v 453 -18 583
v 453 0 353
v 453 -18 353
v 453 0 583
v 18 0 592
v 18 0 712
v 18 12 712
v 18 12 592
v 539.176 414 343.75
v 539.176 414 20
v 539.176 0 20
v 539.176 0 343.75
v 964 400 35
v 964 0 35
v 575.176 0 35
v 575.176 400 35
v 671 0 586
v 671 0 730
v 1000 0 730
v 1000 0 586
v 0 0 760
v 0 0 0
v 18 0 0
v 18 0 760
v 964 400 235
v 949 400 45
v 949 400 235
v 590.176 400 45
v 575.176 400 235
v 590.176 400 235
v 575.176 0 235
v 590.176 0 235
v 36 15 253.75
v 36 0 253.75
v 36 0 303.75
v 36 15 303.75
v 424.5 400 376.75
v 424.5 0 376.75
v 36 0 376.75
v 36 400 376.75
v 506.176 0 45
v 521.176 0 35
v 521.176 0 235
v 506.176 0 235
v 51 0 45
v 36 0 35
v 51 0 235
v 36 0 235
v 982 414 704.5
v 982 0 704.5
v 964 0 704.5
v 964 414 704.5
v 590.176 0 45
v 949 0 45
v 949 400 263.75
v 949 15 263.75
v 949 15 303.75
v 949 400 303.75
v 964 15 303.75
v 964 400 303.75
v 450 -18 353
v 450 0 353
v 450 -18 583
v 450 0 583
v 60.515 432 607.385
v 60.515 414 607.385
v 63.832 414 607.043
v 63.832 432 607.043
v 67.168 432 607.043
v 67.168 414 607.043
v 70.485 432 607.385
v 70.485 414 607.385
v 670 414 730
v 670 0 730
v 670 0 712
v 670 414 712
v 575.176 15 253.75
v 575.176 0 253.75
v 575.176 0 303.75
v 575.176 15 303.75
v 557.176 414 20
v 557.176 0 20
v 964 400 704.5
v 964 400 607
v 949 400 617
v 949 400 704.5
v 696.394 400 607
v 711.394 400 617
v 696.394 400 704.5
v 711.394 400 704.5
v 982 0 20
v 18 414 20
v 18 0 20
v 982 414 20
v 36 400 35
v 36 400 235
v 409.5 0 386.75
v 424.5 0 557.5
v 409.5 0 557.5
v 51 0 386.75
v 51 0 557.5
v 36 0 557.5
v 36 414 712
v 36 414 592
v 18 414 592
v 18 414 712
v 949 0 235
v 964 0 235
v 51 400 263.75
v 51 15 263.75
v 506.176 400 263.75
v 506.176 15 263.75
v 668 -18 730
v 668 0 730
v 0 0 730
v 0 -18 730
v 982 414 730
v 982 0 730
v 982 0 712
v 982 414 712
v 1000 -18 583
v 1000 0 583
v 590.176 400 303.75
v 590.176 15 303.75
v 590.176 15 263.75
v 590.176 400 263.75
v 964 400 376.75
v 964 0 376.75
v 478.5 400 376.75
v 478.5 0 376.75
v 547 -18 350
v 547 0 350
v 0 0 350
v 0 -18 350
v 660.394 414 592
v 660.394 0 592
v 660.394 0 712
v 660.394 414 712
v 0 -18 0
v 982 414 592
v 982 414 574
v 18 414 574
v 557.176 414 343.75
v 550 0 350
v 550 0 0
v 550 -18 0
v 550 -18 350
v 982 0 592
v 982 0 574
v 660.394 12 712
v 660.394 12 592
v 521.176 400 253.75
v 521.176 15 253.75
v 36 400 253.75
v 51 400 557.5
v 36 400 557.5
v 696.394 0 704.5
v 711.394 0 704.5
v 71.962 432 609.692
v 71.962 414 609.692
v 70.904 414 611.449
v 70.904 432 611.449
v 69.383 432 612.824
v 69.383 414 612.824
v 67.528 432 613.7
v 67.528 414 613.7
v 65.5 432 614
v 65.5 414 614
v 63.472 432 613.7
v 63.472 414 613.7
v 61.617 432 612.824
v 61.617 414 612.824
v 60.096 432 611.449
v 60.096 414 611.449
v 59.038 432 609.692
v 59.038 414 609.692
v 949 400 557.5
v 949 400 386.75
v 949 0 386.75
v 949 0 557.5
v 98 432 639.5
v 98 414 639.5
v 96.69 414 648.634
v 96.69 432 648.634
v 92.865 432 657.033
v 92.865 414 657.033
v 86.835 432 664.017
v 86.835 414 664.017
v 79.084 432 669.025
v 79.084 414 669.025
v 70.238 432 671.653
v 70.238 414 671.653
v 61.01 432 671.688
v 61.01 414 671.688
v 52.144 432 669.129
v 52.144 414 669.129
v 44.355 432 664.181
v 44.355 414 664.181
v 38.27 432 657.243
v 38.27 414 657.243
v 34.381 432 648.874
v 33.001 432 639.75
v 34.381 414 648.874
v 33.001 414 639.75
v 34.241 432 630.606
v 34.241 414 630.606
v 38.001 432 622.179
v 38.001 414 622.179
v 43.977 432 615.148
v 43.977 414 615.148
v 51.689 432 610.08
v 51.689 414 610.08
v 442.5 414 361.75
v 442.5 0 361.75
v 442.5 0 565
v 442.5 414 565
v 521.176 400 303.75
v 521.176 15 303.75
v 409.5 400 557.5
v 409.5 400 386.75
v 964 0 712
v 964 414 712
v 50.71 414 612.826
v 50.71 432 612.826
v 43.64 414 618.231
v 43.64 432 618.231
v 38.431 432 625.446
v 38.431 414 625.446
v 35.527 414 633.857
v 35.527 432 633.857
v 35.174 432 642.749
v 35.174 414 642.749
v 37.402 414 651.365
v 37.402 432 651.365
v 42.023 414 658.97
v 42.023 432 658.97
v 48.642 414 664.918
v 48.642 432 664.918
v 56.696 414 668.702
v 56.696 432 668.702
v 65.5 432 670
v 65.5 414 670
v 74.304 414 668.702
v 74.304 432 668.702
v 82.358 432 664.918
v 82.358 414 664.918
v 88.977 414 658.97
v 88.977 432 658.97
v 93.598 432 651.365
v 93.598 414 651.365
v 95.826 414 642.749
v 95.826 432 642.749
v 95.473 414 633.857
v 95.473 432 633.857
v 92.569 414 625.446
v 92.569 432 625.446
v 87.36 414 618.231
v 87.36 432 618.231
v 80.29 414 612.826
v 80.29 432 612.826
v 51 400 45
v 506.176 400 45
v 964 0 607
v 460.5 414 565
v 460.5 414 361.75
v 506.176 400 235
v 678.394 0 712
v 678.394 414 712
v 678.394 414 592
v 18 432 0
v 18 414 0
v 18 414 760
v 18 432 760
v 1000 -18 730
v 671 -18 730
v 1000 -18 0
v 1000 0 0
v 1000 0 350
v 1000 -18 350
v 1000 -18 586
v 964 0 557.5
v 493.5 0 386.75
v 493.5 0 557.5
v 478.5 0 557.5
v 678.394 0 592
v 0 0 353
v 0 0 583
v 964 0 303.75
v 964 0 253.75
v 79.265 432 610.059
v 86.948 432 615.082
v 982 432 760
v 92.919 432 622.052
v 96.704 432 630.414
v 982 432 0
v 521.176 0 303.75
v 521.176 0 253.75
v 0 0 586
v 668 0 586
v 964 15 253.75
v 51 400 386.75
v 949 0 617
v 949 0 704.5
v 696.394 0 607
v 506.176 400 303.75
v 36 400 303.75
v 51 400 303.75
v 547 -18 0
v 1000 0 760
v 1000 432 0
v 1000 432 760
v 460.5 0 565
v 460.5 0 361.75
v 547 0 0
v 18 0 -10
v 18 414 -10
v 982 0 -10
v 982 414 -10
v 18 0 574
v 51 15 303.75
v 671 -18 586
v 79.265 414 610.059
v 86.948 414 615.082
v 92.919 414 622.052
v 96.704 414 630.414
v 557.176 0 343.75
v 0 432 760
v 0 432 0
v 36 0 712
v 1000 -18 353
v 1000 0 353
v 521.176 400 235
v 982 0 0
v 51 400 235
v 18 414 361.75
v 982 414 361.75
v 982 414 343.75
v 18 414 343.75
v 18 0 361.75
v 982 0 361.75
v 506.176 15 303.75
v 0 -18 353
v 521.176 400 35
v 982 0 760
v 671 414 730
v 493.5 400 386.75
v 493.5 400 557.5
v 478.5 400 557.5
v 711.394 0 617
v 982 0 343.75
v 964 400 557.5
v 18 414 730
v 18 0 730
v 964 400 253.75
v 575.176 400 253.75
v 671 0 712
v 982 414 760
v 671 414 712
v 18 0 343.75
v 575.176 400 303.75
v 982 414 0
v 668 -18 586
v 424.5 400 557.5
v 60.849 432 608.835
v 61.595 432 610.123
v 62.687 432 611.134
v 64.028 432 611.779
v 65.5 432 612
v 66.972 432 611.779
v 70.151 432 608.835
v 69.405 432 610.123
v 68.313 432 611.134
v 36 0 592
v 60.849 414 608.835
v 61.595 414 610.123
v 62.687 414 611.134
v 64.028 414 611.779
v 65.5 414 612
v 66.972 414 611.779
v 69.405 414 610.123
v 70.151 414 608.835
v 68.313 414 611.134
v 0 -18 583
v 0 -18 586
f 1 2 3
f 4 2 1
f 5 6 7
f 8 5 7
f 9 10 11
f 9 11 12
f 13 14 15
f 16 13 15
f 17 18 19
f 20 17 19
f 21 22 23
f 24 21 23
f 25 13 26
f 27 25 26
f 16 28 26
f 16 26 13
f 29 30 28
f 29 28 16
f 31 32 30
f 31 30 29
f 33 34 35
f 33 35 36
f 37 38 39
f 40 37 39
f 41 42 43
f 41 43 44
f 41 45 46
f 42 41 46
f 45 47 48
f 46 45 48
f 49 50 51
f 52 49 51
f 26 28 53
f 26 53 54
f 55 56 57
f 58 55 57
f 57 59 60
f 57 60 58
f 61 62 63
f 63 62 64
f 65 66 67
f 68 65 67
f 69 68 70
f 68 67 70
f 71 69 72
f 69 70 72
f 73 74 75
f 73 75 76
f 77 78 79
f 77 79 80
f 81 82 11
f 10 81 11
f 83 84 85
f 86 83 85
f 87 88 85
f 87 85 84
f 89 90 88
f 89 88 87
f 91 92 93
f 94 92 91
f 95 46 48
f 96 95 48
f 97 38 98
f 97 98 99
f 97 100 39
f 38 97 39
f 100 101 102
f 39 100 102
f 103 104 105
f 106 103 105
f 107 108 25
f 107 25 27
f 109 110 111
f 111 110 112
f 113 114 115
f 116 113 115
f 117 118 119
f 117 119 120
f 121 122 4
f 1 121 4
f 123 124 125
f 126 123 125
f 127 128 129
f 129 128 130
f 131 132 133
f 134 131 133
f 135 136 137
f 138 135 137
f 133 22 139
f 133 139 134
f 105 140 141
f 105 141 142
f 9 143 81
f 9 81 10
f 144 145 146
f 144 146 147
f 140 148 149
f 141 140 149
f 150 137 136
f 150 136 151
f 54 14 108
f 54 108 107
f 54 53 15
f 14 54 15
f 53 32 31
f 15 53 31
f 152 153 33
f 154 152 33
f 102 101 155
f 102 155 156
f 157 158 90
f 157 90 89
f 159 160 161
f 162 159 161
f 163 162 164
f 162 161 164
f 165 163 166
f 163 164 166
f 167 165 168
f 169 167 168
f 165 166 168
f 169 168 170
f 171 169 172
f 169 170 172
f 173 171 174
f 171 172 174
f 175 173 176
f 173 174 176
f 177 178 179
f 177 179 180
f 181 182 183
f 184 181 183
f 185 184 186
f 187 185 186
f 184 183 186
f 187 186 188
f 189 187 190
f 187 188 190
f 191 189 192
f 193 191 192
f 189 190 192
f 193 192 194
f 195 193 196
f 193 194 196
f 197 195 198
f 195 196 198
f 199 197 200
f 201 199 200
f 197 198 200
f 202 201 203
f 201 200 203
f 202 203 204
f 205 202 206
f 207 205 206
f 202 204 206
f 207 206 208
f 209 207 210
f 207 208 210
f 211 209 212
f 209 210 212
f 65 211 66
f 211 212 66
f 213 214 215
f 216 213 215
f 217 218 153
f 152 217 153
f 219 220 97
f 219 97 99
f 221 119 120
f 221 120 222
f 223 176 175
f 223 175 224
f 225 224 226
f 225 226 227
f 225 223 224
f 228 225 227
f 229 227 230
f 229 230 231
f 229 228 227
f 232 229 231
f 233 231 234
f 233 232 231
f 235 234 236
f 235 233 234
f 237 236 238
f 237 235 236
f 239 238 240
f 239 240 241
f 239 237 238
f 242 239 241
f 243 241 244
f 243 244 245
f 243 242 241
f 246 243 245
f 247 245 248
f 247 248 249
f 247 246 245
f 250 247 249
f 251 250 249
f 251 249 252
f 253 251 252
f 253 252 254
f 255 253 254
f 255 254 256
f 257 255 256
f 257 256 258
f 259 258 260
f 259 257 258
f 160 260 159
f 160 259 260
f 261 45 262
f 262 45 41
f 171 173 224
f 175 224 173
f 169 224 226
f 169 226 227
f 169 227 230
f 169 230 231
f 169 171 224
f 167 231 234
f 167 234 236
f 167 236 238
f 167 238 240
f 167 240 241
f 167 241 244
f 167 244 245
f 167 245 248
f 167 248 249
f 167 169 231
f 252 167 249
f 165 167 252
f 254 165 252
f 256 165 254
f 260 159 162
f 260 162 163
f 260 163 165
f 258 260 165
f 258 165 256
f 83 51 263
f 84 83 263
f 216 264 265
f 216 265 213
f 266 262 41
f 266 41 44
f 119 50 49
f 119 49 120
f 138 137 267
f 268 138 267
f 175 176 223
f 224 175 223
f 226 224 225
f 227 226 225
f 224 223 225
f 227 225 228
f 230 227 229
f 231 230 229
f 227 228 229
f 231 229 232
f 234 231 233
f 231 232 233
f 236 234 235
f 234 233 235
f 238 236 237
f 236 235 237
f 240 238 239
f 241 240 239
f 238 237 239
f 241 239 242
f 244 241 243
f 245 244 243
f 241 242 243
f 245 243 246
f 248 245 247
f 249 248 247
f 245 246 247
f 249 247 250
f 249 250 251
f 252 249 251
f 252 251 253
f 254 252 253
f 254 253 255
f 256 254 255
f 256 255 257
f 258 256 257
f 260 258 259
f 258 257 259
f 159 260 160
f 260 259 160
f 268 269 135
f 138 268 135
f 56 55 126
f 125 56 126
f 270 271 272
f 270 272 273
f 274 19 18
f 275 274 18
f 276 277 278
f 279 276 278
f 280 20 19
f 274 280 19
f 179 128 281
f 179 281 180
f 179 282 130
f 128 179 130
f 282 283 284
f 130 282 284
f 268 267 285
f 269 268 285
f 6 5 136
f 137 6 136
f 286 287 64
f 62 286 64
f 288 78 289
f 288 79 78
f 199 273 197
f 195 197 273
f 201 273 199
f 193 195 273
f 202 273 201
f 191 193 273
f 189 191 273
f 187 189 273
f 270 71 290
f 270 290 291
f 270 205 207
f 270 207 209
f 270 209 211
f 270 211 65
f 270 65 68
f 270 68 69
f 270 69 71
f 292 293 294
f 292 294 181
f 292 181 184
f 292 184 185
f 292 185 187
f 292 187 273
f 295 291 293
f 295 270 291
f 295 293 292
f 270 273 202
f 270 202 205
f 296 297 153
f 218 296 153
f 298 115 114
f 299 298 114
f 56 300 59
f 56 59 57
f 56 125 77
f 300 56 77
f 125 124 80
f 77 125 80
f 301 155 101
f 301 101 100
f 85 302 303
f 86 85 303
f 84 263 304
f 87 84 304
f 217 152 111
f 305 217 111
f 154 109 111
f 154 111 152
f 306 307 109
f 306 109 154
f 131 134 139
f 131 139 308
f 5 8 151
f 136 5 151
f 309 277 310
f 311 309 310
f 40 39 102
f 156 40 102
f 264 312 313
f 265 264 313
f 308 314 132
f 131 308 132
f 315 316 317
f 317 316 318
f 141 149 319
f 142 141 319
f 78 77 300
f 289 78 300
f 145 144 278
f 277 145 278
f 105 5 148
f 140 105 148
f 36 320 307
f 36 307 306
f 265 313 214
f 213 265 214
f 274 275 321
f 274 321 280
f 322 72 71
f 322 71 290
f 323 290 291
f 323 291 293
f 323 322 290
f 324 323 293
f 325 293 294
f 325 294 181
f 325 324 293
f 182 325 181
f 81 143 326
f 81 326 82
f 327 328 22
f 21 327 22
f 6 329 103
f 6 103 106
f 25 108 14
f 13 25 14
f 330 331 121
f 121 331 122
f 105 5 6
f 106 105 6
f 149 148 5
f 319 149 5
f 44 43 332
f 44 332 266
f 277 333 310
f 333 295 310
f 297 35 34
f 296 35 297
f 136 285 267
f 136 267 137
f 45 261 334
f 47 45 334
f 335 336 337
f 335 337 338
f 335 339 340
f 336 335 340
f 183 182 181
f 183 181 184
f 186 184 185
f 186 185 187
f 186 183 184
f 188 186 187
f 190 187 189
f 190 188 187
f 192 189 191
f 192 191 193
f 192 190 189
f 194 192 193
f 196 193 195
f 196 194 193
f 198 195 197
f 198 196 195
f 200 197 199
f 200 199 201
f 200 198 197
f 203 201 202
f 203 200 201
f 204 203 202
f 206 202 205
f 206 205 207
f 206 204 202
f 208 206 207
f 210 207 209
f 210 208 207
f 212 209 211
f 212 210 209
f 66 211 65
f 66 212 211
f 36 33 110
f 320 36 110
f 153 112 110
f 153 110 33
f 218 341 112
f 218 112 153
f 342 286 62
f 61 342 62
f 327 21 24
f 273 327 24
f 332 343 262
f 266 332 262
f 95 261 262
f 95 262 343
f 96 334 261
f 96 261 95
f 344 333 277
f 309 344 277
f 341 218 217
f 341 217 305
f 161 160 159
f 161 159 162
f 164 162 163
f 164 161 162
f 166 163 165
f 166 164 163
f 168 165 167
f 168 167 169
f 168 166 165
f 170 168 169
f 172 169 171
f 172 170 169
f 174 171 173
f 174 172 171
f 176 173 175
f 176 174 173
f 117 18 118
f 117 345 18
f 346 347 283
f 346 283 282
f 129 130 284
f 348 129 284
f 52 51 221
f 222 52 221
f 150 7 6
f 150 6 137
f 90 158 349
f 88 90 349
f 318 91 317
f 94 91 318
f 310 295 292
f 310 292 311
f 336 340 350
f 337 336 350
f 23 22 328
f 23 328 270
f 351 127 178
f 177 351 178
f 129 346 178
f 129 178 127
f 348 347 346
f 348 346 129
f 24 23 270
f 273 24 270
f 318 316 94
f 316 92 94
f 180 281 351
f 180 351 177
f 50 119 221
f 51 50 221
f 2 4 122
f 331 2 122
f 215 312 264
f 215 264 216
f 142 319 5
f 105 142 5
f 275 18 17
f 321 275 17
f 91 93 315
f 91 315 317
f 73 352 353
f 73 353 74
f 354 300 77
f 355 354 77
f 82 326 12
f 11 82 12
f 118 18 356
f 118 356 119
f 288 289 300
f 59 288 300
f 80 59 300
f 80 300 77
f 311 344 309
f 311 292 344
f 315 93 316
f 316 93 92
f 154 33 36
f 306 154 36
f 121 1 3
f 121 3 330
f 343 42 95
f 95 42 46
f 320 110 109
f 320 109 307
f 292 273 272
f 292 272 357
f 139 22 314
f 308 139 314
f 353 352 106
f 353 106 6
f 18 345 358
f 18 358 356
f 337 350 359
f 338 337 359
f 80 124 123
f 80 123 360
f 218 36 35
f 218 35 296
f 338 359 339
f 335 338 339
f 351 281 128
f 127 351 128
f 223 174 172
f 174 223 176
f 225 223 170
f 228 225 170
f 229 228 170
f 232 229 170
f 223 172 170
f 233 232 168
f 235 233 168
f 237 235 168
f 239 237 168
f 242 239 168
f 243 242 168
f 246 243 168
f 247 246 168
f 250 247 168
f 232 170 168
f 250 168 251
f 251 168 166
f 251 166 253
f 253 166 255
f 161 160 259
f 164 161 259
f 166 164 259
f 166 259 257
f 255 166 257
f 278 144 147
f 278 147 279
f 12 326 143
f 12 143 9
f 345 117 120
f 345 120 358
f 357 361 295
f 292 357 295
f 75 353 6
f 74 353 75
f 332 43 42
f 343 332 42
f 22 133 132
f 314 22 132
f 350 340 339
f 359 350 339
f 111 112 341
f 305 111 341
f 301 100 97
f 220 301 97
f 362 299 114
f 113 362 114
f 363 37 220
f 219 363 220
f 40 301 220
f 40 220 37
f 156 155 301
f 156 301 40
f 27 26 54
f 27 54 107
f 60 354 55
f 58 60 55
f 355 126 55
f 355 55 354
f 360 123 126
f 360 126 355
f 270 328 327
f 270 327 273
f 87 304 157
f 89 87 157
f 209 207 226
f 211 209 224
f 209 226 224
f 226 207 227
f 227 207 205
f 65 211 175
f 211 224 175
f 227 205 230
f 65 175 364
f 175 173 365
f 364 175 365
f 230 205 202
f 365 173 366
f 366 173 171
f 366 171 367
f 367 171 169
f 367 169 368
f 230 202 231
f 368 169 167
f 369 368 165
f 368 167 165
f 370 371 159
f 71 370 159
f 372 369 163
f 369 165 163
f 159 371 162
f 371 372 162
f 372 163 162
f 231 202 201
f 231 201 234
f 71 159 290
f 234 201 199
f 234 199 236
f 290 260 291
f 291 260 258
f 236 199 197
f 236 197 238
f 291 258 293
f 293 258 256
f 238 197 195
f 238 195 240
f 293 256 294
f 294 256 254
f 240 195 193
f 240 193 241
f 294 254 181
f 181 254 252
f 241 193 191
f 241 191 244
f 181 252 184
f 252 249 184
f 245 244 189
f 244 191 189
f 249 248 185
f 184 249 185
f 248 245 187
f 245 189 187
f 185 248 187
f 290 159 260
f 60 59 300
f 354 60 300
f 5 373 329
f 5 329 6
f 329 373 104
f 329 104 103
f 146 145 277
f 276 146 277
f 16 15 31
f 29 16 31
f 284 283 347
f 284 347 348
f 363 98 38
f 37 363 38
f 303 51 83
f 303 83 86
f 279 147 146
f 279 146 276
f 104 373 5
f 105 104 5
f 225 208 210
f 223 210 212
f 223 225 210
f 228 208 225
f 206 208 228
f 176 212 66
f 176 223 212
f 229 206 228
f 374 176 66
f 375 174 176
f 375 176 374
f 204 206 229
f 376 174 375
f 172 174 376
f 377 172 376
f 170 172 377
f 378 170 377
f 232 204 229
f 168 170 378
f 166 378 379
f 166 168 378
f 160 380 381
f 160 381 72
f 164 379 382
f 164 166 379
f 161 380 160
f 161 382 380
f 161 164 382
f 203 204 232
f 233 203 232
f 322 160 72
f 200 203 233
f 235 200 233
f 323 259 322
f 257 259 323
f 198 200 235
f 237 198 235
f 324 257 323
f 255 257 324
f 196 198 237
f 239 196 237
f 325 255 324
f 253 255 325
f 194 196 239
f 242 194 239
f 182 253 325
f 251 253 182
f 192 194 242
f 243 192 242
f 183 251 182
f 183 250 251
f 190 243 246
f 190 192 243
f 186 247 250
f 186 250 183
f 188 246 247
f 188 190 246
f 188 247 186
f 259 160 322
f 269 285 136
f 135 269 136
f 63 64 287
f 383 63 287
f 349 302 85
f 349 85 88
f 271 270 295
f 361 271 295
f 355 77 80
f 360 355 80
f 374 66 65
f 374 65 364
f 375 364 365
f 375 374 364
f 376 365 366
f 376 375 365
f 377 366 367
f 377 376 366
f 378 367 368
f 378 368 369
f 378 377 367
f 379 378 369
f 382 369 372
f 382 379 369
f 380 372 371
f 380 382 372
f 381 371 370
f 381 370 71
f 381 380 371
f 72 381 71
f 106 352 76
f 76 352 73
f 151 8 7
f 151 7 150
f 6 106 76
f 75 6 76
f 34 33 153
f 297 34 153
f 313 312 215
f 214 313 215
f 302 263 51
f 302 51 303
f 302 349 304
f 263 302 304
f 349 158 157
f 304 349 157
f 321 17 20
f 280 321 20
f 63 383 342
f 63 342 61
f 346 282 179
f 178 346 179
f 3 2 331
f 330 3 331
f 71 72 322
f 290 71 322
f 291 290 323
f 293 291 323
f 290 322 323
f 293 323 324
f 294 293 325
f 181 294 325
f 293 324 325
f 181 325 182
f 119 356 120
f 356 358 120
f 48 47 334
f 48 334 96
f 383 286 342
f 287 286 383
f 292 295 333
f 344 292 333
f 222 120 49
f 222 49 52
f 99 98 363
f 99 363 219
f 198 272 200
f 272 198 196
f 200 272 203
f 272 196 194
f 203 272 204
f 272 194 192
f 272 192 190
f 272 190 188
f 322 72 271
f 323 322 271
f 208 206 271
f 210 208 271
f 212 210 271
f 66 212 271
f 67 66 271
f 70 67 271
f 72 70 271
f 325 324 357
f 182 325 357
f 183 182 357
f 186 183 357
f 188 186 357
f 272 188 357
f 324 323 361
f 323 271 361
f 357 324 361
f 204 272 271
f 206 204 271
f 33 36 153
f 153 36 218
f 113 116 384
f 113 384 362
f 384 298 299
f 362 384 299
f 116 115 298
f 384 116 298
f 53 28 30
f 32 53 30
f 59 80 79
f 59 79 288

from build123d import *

# Parameters (mm, degrees)
F0_W           = 18
F0_H           = 414
F0_H_2         = 18
F1_DEPTH       = 760
F0_W_2         = 964
F2_DEPTH       = 760
F3_DEPTH       = 20
F3_DEPTH_BACK  = 10
F5_DEPTH       = 18
F4_W           = 652
F4_H           = 114
F4_H_2         = 300
F7_W           = 432
F7_H           = 230
F7_W_2         = 18
F8_DEPTH       = 18
F7_W_3         = 300
F7_W_4         = 244
F7_W_5         = 3
F7_W_6         = 450
F7_H_2         = 350
F7_W_7         = 226
F7_W_8         = 650
F7_H_3         = 80
F7_H_4         = 46
F7_H_5         = 18
F7_W_9         = 311
F10_DEPTH      = 414
F9_W           = 18
F9_H           = 9
F9_W_2         = 624.3935708242
F9_H_2         = 6
F9_H_3         = 3
F9_W_3         = 7.6064291758
F9_W_4         = 237.6064291758
F9_W_5         = 15
F9_W_6         = 10.3935708242
F9_H_4         = 15
F9_H_5         = 10
F11_DEPTH      = 414
F9_H_6         = 7.5
F9_H_7         = 170.74959
F9_H_8         = 291.25041
F9_H_9         = 120
F9_W_7         = 358.5
F12_DEPTH      = 400
F9_W_8         = 455.5
F9_H_10        = 190
F9_W_9         = 358.8239558978
F9_W_10        = 455.1760441022
F9_H_11        = 40
F9_H_12        = 87.5
F13_W          = 358.8239558978
F13_H          = 15
F13_W_2        = 15
F14_DEPTH      = 40
F14_DEPTH_BACK = 10
F13_W_3        = 485.1760441022
F16_W          = 642.3935708242
F16_H          = 12
F17_DEPTH      = 120
F19_DEPTH      = 18
F20_DEPTH      = 18


# Not quite as in the source:
# - a feature names something its author has since deleted; it is built from what else it names


with BuildPart() as f1:
    # F0 (on Top) → F1 (new body)
    with BuildSketch(Plane.XY):
        with Locations((9, 207)):
            Rectangle(F0_W, F0_H)
        with Locations((9, 423)):
            Rectangle(F0_W, F0_H_2)
    extrude(amount=F1_DEPTH)


with BuildPart() as f1b:
    # F0 (on Top) → F1, piece 2 (new body)
    with BuildSketch(Plane.XY):
        with Locations((991, 207)):
            Rectangle(F0_W, F0_H)
        with Locations((991, 423)):
            Rectangle(F0_W, F0_H_2)
    extrude(amount=F1_DEPTH)


with BuildPart() as f2:
    # F0 (on Top) → F2 (new body, through all)
    with BuildSketch(Plane.XY):
        with Locations((500, 423)):
            Rectangle(F0_W_2, F0_H_2)
    extrude(amount=F2_DEPTH)

    # F18 (on face) → F19 (cut, through all)
    with BuildSketch(Plane.XZ.offset(-414)):
        with BuildLine():
            ThreePointArc((60.5148148474, 607.3846153846), (65.5, 612), (70.4851851526, 607.3846153846))
            ThreePointArc((70.4851851526, 607.3846153846), (90.1806454277, 618.3548884782), (98, 639.5))
            ThreePointArc((98, 639.5), (44.3548884782, 664.1806454277), (60.5148148474, 607.3846153846))
        make_face()
        with BuildLine():
            ThreePointArc((59.0384615385, 609.6923076923), (65.5, 670), (71.9615384615, 609.6923076923))
            ThreePointArc((71.9615384615, 609.6923076923), (65.5, 614), (59.0384615385, 609.6923076923))
        make_face(mode=Mode.SUBTRACT)
        with BuildLine():
            ThreePointArc((60.5148148474, 607.3846153846), (65.5, 607), (70.4851851526, 607.3846153846))
            ThreePointArc((70.4851851526, 607.3846153846), (65.5, 612), (60.5148148474, 607.3846153846))
        make_face()
    extrude(amount=-F19_DEPTH, mode=Mode.SUBTRACT)


with BuildPart() as f3:
    # F0 (on Top) → F3 (new body, two sides)
    with BuildSketch(Plane.XY) as f3_sk:
        with Locations((500, 207)):
            Rectangle(F0_W_2, F0_H)
    extrude(amount=F3_DEPTH)
    extrude(f3_sk.sketch, amount=-F3_DEPTH_BACK)


with BuildPart() as f5:
    # F4 (on face) → F5 (new body)
    with BuildSketch(Plane.XY.offset(760)):
        Polygon((671, 0), (982, 0), (982, 414), (671, 414), (671, 300), align=None)
    extrude(amount=-F5_DEPTH)


with BuildPart() as f5b:
    # F4 (on face) → F5, piece 2 (new body)
    with BuildSketch(Plane.XY.offset(760)):
        with Locations((344, 357)):
            Rectangle(F4_W, F4_H)
        with Locations((344, 150)):
            Rectangle(F4_W, F4_H_2)
    extrude(amount=-F5_DEPTH)


with BuildPart() as f5_1:
    # F6: moved
    add(f5.part.moved(Location((0, 0, -30))))


with BuildPart() as f5b_1:
    # F6: moved
    add(f5b.part.moved(Location((0, 0, -30))))


with BuildPart() as f8:
    # F7 (on face) → F8 (new body)
    with BuildSketch(Plane.XZ):
        with Locations((234, 468)):
            Rectangle(F7_W, F7_H)
        with Locations((9, 468)):
            Rectangle(F7_W_2, F7_H)
    extrude(amount=F8_DEPTH)


with BuildPart() as f8b:
    # F7 (on face) → F8, piece 2 (new body)
    with BuildSketch(Plane.XZ):
        with Locations((603, 468)):
            Rectangle(F7_W_3, F7_H)
        with Locations((878, 468)):
            Rectangle(F7_W_4, F7_H)
        with Locations((754.5, 468)):
            Rectangle(F7_W_5, F7_H)
    extrude(amount=F8_DEPTH)


with BuildPart() as f8c:
    # F7 (on face) → F8, piece 3 (new body)
    with BuildSketch(Plane.XZ):
        with Locations((775, 175)):
            Rectangle(F7_W_6, F7_H_2)
    extrude(amount=F8_DEPTH)


with BuildPart() as f8d:
    # F7 (on face) → F8, piece 4 (new body)
    with BuildSketch(Plane.XZ):
        with Locations((397, 175)):
            Rectangle(F7_W_3, F7_H_2)
        with Locations((131, 175)):
            Rectangle(F7_W_7, F7_H_2)
        with Locations((9, 175)):
            Rectangle(F7_W_2, F7_H_2)
        with Locations((245.5, 175)):
            Rectangle(F7_W_5, F7_H_2)
    extrude(amount=F8_DEPTH)


with BuildPart() as f8e:
    # F7 (on face) → F8, piece 5 (new body)
    with BuildSketch(Plane.XZ):
        with Locations((343, 626)):
            Rectangle(F7_W_8, F7_H_3)
        with Locations((9, 626)):
            Rectangle(F7_W_2, F7_H_3)
        with Locations((9, 689)):
            Rectangle(F7_W_2, F7_H_4)
        with Locations((343, 689)):
            Rectangle(F7_W_8, F7_H_4)
        with Locations((343, 721)):
            Rectangle(F7_W_8, F7_H_5)
        with Locations((9, 721)):
            Rectangle(F7_W_2, F7_H_5)
    extrude(amount=F8_DEPTH)


with BuildPart() as f8f:
    # F7 (on face) → F8, piece 6 (new body)
    with BuildSketch(Plane.XZ):
        Polygon((1000, 730), (671, 730), (671, 604), (982, 604), (982, 586), (1000, 586), align=None)
        with Locations((826.5, 595)):
            Rectangle(F7_W_9, F7_H_5)
    extrude(amount=F8_DEPTH)


with BuildPart() as f10:
    # F9 (on face) → F10 (new body, through all)
    with BuildSketch(Plane(origin=(0, 0, 0), x_dir=(-1, 0, 0), z_dir=(0, 1, 0))):
        Polygon((-18, 361.75041), (-36, 361.75041), (-51, 361.75041), (-442.5, 361.75041), (-460.5, 361.75041), (-964, 361.75041), (-982, 361.75041), (-982, 343.75041), (-964, 343.75041), (-949, 343.75041), (-590.1760441022, 343.75041), (-575.1760441022, 343.75041), (-557.1760441022, 343.75041), (-539.1760441022, 343.75041), (-521.1760441022, 343.75041), (-506.1760441022, 343.75041), (-51, 343.75041), (-36, 343.75041), (-18, 343.75041), align=None)
    extrude(amount=F10_DEPTH)


with BuildPart() as f10b:
    # F9 (on face) → F10, piece 2 (new body, through all)
    with BuildSketch(Plane(origin=(0, 0, 0), x_dir=(-1, 0, 0), z_dir=(0, 1, 0))):
        Polygon((-18, 574), (-18, 583), (-36, 583), (-660.3935708242, 583), (-678.3935708242, 583), (-696.3935708242, 583), (-711.3935708242, 583), (-949, 583), (-964, 583), (-982, 583), (-982, 574), (-424.5, 574), (-409.5, 574), align=None)
        with Locations((-687.3935708242, 587.5)):
            Rectangle(F9_W, F9_H)
        Polygon((-678.3935708242, 583), (-660.3935708242, 583), (-660.3935708242, 586), (-668, 586), (-668, 592), (-678.3935708242, 592), align=None)
        with Locations((-973, 587.5)):
            Rectangle(F9_W, F9_H)
        with Locations((-348.1967854121, 589)):
            Rectangle(F9_W_2, F9_H_2)
        with Locations((-27, 589)):
            Rectangle(F9_W, F9_H_2)
        with Locations((-27, 584.5)):
            Rectangle(F9_W, F9_H_3)
        with Locations((-348.1967854121, 584.5)):
            Rectangle(F9_W_2, F9_H_3)
        with Locations((-664.1967854121, 589)):
            Rectangle(F9_W_3, F9_H_2)
        with Locations((-830.1967854121, 587.5)):
            Rectangle(F9_W_4, F9_H)
        with Locations((-956.5, 587.5)):
            Rectangle(F9_W_5, F9_H)
        with Locations((-703.8935708242, 587.5)):
            Rectangle(F9_W_5, F9_H)
    extrude(amount=F10_DEPTH)


with BuildPart() as f11:
    # F9 (on face) → F11 (new body, through all)
    with BuildSketch(Plane(origin=(0, 0, 0), x_dir=(-1, 0, 0), z_dir=(0, 1, 0))):
        Polygon((-668, 617), (-668, 712), (-678.3935708242, 712), (-678.3935708242, 704.5), (-678.3935708242, 617), align=None)
        Polygon((-668, 592), (-660.3935708242, 592), (-660.3935708242, 712), (-668, 712), (-668, 617), (-668, 607), align=None)
        with Locations((-673.1967854121, 599.5)):
            Rectangle(F9_W_6, F9_H_4)
        with Locations((-673.1967854121, 612)):
            Rectangle(F9_W_6, F9_H_5)
    extrude(amount=F11_DEPTH)


with BuildPart() as f11b:
    # F9 (on face) → F11, piece 2 (new body, through all)
    with BuildSketch(Plane(origin=(0, 0, 0), x_dir=(-1, 0, 0), z_dir=(0, 1, 0))):
        with Locations((-451.5, 561.25)):
            Rectangle(F9_W, F9_H_6)
        with Locations((-451.5, 472.125205)):
            Rectangle(F9_W, F9_H_7)
        with Locations((-451.5, 381.75041)):
            Rectangle(F9_W, F9_H_5)
        with Locations((-451.5, 369.25041)):
            Rectangle(F9_W, F9_H_4)
    extrude(amount=F11_DEPTH)


with BuildPart() as f11c:
    # F9 (on face) → F11, piece 3 (new body, through all)
    with BuildSketch(Plane(origin=(0, 0, 0), x_dir=(-1, 0, 0), z_dir=(0, 1, 0))):
        with Locations((-548.1760441022, 340.00041)):
            Rectangle(F9_W, F9_H_6)
        with Locations((-548.1760441022, 190.625205)):
            Rectangle(F9_W, F9_H_8)
        with Locations((-548.1760441022, 40)):
            Rectangle(F9_W, F9_H_5)
        with Locations((-548.1760441022, 27.5)):
            Rectangle(F9_W, F9_H_4)
    extrude(amount=F11_DEPTH)


with BuildPart() as f11d:
    # F9 (on face) → F11, piece 4 (new body, through all)
    with BuildSketch(Plane(origin=(0, 0, 0), x_dir=(-1, 0, 0), z_dir=(0, 1, 0))):
        with Locations((-973, 708.25)):
            Rectangle(F9_W, F9_H_6)
    extrude(amount=F11_DEPTH)


with BuildPart() as f11e:
    # F9 (on face) → F11, piece 5 (new body, through all)
    with BuildSketch(Plane(origin=(0, 0, 0), x_dir=(-1, 0, 0), z_dir=(0, 1, 0))):
        with Locations((-27, 652)):
            Rectangle(F9_W, F9_H_9)
    extrude(amount=F11_DEPTH)


with BuildPart() as f12:
    # F9 (on face) → F12 (new body)
    with BuildSketch(Plane(origin=(0, 0, 0), x_dir=(-1, 0, 0), z_dir=(0, 1, 0))):
        with Locations((-43.5, 472.125205)):
            Rectangle(F9_W_5, F9_H_7)
        with Locations((-43.5, 381.75041)):
            Rectangle(F9_W_5, F9_H_5)
        with Locations((-230.25, 381.75041)):
            Rectangle(F9_W_7, F9_H_5)
        with Locations((-417, 381.75041)):
            Rectangle(F9_W_5, F9_H_5)
        with Locations((-417, 472.125205)):
            Rectangle(F9_W_5, F9_H_7)
    extrude(amount=F12_DEPTH)


with BuildPart() as f12b:
    # F9 (on face) → F12, piece 2 (new body)
    with BuildSketch(Plane(origin=(0, 0, 0), x_dir=(-1, 0, 0), z_dir=(0, 1, 0))):
        with Locations((-486, 472.125205)):
            Rectangle(F9_W_5, F9_H_7)
        with Locations((-486, 381.75041)):
            Rectangle(F9_W_5, F9_H_5)
        with Locations((-721.25, 381.75041)):
            Rectangle(F9_W_8, F9_H_5)
        with Locations((-956.5, 381.75041)):
            Rectangle(F9_W_5, F9_H_5)
        with Locations((-956.5, 472.125205)):
            Rectangle(F9_W_5, F9_H_7)
    extrude(amount=F12_DEPTH)


with BuildPart() as f12c:
    # F9 (on face) → F12, piece 3 (new body)
    with BuildSketch(Plane(origin=(0, 0, 0), x_dir=(-1, 0, 0), z_dir=(0, 1, 0))):
        with Locations((-956.5, 140)):
            Rectangle(F9_W_5, F9_H_10)
        with Locations((-956.5, 40)):
            Rectangle(F9_W_5, F9_H_5)
        with Locations((-769.5880220511, 40)):
            Rectangle(F9_W_9, F9_H_5)
        with Locations((-582.6760441022, 40)):
            Rectangle(F9_W_5, F9_H_5)
        with Locations((-582.6760441022, 140)):
            Rectangle(F9_W_5, F9_H_10)
    extrude(amount=F12_DEPTH)


with BuildPart() as f12d:
    # F9 (on face) → F12, piece 4 (new body)
    with BuildSketch(Plane(origin=(0, 0, 0), x_dir=(-1, 0, 0), z_dir=(0, 1, 0))):
        with Locations((-513.6760441022, 40)):
            Rectangle(F9_W_5, F9_H_5)
        with Locations((-513.6760441022, 140)):
            Rectangle(F9_W_5, F9_H_10)
        with Locations((-278.5880220511, 40)):
            Rectangle(F9_W_10, F9_H_5)
        with Locations((-43.5, 40)):
            Rectangle(F9_W_5, F9_H_5)
        with Locations((-43.5, 140)):
            Rectangle(F9_W_5, F9_H_10)
    extrude(amount=F12_DEPTH)


with BuildPart() as f12e:
    # F9 (on face) → F12, piece 5 (new body)
    with BuildSketch(Plane(origin=(0, 0, 0), x_dir=(-1, 0, 0), z_dir=(0, 1, 0))):
        with Locations((-513.6760441022, 283.75041)):
            Rectangle(F9_W_5, F9_H_11)
        with Locations((-513.6760441022, 258.75041)):
            Rectangle(F9_W_5, F9_H_5)
        with Locations((-278.5880220511, 258.75041)):
            Rectangle(F9_W_10, F9_H_5)
        with Locations((-43.5, 258.75041)):
            Rectangle(F9_W_5, F9_H_5)
        with Locations((-43.5, 283.75041)):
            Rectangle(F9_W_5, F9_H_11)
    extrude(amount=F12_DEPTH)


with BuildPart() as f12f:
    # F9 (on face) → F12, piece 6 (new body)
    with BuildSketch(Plane(origin=(0, 0, 0), x_dir=(-1, 0, 0), z_dir=(0, 1, 0))):
        with Locations((-582.6760441022, 283.75041)):
            Rectangle(F9_W_5, F9_H_11)
        with Locations((-582.6760441022, 258.75041)):
            Rectangle(F9_W_5, F9_H_5)
        with Locations((-769.5880220511, 258.75041)):
            Rectangle(F9_W_9, F9_H_5)
        with Locations((-956.5, 283.75041)):
            Rectangle(F9_W_5, F9_H_11)
        with Locations((-956.5, 258.75041)):
            Rectangle(F9_W_5, F9_H_5)
    extrude(amount=F12_DEPTH)


with BuildPart() as f12g:
    # F9 (on face) → F12, piece 7 (new body)
    with BuildSketch(Plane(origin=(0, 0, 0), x_dir=(-1, 0, 0), z_dir=(0, 1, 0))):
        with Locations((-956.5, 660.75)):
            Rectangle(F9_W_5, F9_H_12)
        with Locations((-703.8935708242, 660.75)):
            Rectangle(F9_W_5, F9_H_12)
        with Locations((-703.8935708242, 612)):
            Rectangle(F9_W_5, F9_H_5)
        with Locations((-830.1967854121, 612)):
            Rectangle(F9_W_4, F9_H_5)
        with Locations((-956.5, 612)):
            Rectangle(F9_W_5, F9_H_5)
    extrude(amount=F12_DEPTH)


with BuildPart() as f14:
    # F13 (on face) → F14 (new body, two sides)
    with BuildSketch(Plane.XY.offset(263.75041)) as f14_sk:
        with Locations((769.5880220511, 7.5)):
            Rectangle(F13_W, F13_H)
        with Locations((956.5, 7.5)):
            Rectangle(F13_W_2, F13_H)
        with Locations((582.6760441022, 7.5)):
            Rectangle(F13_W_2, F13_H)
    extrude(amount=F14_DEPTH)
    extrude(f14_sk.sketch, amount=-F14_DEPTH_BACK)


with BuildPart() as f14b:
    # F13 (on face) → F14, piece 2 (new body, two sides)
    with BuildSketch(Plane.XY.offset(263.75041)) as f14_2_sk:
        with Locations((278.5880220511, 7.5)):
            Rectangle(F13_W_3, F13_H)
    extrude(amount=F14_DEPTH)
    extrude(f14_2_sk.sketch, amount=-F14_DEPTH_BACK)


with BuildPart() as f12f_1:
    add(f12f.part)

    # F15: cut F14, F14b
    add(f14.part, mode=Mode.SUBTRACT)
    add(f14b.part, mode=Mode.SUBTRACT)


with BuildPart() as f12e_1:
    add(f12e.part)

    # F15: cut F14, F14b
    add(f14.part, mode=Mode.SUBTRACT)
    add(f14b.part, mode=Mode.SUBTRACT)


with BuildPart() as f17:
    # F16 (on face) → F17 (new body, through all)
    with BuildSketch(Plane.XY.offset(592)):
        with Locations((339.1967854121, 6)):
            Rectangle(F16_W, F16_H)
    extrude(amount=F17_DEPTH)


with BuildPart() as f20:
    # F18 (on face) → F20 (new body, through all)
    with BuildSketch(Plane.XZ.offset(-414)):
        with BuildLine():
            ThreePointArc((60.5148148474, 607.3846153846), (65.5, 612), (70.4851851526, 607.3846153846))
            ThreePointArc((70.4851851526, 607.3846153846), (90.1806454277, 618.3548884782), (98, 639.5))
            ThreePointArc((98, 639.5), (44.3548884782, 664.1806454277), (60.5148148474, 607.3846153846))
        make_face()
        with BuildLine():
            ThreePointArc((59.0384615385, 609.6923076923), (65.5, 670), (71.9615384615, 609.6923076923))
            ThreePointArc((71.9615384615, 609.6923076923), (65.5, 614), (59.0384615385, 609.6923076923))
        make_face(mode=Mode.SUBTRACT)
    extrude(amount=-F20_DEPTH)


solid = Compound([f1.part, f1b.part, f2.part, f3.part, f5_1.part, f5b_1.part, f8.part, f8b.part, f8c.part, f8d.part, f8e.part, f8f.part, f10.part, f10b.part, f11.part, f11b.part, f11c.part, f11d.part, f11e.part, f12.part, f12b.part, f12c.part, f12d.part, f12g.part, f14.part, f14b.part, f12f_1.part, f12e_1.part, f17.part, f20.part])
